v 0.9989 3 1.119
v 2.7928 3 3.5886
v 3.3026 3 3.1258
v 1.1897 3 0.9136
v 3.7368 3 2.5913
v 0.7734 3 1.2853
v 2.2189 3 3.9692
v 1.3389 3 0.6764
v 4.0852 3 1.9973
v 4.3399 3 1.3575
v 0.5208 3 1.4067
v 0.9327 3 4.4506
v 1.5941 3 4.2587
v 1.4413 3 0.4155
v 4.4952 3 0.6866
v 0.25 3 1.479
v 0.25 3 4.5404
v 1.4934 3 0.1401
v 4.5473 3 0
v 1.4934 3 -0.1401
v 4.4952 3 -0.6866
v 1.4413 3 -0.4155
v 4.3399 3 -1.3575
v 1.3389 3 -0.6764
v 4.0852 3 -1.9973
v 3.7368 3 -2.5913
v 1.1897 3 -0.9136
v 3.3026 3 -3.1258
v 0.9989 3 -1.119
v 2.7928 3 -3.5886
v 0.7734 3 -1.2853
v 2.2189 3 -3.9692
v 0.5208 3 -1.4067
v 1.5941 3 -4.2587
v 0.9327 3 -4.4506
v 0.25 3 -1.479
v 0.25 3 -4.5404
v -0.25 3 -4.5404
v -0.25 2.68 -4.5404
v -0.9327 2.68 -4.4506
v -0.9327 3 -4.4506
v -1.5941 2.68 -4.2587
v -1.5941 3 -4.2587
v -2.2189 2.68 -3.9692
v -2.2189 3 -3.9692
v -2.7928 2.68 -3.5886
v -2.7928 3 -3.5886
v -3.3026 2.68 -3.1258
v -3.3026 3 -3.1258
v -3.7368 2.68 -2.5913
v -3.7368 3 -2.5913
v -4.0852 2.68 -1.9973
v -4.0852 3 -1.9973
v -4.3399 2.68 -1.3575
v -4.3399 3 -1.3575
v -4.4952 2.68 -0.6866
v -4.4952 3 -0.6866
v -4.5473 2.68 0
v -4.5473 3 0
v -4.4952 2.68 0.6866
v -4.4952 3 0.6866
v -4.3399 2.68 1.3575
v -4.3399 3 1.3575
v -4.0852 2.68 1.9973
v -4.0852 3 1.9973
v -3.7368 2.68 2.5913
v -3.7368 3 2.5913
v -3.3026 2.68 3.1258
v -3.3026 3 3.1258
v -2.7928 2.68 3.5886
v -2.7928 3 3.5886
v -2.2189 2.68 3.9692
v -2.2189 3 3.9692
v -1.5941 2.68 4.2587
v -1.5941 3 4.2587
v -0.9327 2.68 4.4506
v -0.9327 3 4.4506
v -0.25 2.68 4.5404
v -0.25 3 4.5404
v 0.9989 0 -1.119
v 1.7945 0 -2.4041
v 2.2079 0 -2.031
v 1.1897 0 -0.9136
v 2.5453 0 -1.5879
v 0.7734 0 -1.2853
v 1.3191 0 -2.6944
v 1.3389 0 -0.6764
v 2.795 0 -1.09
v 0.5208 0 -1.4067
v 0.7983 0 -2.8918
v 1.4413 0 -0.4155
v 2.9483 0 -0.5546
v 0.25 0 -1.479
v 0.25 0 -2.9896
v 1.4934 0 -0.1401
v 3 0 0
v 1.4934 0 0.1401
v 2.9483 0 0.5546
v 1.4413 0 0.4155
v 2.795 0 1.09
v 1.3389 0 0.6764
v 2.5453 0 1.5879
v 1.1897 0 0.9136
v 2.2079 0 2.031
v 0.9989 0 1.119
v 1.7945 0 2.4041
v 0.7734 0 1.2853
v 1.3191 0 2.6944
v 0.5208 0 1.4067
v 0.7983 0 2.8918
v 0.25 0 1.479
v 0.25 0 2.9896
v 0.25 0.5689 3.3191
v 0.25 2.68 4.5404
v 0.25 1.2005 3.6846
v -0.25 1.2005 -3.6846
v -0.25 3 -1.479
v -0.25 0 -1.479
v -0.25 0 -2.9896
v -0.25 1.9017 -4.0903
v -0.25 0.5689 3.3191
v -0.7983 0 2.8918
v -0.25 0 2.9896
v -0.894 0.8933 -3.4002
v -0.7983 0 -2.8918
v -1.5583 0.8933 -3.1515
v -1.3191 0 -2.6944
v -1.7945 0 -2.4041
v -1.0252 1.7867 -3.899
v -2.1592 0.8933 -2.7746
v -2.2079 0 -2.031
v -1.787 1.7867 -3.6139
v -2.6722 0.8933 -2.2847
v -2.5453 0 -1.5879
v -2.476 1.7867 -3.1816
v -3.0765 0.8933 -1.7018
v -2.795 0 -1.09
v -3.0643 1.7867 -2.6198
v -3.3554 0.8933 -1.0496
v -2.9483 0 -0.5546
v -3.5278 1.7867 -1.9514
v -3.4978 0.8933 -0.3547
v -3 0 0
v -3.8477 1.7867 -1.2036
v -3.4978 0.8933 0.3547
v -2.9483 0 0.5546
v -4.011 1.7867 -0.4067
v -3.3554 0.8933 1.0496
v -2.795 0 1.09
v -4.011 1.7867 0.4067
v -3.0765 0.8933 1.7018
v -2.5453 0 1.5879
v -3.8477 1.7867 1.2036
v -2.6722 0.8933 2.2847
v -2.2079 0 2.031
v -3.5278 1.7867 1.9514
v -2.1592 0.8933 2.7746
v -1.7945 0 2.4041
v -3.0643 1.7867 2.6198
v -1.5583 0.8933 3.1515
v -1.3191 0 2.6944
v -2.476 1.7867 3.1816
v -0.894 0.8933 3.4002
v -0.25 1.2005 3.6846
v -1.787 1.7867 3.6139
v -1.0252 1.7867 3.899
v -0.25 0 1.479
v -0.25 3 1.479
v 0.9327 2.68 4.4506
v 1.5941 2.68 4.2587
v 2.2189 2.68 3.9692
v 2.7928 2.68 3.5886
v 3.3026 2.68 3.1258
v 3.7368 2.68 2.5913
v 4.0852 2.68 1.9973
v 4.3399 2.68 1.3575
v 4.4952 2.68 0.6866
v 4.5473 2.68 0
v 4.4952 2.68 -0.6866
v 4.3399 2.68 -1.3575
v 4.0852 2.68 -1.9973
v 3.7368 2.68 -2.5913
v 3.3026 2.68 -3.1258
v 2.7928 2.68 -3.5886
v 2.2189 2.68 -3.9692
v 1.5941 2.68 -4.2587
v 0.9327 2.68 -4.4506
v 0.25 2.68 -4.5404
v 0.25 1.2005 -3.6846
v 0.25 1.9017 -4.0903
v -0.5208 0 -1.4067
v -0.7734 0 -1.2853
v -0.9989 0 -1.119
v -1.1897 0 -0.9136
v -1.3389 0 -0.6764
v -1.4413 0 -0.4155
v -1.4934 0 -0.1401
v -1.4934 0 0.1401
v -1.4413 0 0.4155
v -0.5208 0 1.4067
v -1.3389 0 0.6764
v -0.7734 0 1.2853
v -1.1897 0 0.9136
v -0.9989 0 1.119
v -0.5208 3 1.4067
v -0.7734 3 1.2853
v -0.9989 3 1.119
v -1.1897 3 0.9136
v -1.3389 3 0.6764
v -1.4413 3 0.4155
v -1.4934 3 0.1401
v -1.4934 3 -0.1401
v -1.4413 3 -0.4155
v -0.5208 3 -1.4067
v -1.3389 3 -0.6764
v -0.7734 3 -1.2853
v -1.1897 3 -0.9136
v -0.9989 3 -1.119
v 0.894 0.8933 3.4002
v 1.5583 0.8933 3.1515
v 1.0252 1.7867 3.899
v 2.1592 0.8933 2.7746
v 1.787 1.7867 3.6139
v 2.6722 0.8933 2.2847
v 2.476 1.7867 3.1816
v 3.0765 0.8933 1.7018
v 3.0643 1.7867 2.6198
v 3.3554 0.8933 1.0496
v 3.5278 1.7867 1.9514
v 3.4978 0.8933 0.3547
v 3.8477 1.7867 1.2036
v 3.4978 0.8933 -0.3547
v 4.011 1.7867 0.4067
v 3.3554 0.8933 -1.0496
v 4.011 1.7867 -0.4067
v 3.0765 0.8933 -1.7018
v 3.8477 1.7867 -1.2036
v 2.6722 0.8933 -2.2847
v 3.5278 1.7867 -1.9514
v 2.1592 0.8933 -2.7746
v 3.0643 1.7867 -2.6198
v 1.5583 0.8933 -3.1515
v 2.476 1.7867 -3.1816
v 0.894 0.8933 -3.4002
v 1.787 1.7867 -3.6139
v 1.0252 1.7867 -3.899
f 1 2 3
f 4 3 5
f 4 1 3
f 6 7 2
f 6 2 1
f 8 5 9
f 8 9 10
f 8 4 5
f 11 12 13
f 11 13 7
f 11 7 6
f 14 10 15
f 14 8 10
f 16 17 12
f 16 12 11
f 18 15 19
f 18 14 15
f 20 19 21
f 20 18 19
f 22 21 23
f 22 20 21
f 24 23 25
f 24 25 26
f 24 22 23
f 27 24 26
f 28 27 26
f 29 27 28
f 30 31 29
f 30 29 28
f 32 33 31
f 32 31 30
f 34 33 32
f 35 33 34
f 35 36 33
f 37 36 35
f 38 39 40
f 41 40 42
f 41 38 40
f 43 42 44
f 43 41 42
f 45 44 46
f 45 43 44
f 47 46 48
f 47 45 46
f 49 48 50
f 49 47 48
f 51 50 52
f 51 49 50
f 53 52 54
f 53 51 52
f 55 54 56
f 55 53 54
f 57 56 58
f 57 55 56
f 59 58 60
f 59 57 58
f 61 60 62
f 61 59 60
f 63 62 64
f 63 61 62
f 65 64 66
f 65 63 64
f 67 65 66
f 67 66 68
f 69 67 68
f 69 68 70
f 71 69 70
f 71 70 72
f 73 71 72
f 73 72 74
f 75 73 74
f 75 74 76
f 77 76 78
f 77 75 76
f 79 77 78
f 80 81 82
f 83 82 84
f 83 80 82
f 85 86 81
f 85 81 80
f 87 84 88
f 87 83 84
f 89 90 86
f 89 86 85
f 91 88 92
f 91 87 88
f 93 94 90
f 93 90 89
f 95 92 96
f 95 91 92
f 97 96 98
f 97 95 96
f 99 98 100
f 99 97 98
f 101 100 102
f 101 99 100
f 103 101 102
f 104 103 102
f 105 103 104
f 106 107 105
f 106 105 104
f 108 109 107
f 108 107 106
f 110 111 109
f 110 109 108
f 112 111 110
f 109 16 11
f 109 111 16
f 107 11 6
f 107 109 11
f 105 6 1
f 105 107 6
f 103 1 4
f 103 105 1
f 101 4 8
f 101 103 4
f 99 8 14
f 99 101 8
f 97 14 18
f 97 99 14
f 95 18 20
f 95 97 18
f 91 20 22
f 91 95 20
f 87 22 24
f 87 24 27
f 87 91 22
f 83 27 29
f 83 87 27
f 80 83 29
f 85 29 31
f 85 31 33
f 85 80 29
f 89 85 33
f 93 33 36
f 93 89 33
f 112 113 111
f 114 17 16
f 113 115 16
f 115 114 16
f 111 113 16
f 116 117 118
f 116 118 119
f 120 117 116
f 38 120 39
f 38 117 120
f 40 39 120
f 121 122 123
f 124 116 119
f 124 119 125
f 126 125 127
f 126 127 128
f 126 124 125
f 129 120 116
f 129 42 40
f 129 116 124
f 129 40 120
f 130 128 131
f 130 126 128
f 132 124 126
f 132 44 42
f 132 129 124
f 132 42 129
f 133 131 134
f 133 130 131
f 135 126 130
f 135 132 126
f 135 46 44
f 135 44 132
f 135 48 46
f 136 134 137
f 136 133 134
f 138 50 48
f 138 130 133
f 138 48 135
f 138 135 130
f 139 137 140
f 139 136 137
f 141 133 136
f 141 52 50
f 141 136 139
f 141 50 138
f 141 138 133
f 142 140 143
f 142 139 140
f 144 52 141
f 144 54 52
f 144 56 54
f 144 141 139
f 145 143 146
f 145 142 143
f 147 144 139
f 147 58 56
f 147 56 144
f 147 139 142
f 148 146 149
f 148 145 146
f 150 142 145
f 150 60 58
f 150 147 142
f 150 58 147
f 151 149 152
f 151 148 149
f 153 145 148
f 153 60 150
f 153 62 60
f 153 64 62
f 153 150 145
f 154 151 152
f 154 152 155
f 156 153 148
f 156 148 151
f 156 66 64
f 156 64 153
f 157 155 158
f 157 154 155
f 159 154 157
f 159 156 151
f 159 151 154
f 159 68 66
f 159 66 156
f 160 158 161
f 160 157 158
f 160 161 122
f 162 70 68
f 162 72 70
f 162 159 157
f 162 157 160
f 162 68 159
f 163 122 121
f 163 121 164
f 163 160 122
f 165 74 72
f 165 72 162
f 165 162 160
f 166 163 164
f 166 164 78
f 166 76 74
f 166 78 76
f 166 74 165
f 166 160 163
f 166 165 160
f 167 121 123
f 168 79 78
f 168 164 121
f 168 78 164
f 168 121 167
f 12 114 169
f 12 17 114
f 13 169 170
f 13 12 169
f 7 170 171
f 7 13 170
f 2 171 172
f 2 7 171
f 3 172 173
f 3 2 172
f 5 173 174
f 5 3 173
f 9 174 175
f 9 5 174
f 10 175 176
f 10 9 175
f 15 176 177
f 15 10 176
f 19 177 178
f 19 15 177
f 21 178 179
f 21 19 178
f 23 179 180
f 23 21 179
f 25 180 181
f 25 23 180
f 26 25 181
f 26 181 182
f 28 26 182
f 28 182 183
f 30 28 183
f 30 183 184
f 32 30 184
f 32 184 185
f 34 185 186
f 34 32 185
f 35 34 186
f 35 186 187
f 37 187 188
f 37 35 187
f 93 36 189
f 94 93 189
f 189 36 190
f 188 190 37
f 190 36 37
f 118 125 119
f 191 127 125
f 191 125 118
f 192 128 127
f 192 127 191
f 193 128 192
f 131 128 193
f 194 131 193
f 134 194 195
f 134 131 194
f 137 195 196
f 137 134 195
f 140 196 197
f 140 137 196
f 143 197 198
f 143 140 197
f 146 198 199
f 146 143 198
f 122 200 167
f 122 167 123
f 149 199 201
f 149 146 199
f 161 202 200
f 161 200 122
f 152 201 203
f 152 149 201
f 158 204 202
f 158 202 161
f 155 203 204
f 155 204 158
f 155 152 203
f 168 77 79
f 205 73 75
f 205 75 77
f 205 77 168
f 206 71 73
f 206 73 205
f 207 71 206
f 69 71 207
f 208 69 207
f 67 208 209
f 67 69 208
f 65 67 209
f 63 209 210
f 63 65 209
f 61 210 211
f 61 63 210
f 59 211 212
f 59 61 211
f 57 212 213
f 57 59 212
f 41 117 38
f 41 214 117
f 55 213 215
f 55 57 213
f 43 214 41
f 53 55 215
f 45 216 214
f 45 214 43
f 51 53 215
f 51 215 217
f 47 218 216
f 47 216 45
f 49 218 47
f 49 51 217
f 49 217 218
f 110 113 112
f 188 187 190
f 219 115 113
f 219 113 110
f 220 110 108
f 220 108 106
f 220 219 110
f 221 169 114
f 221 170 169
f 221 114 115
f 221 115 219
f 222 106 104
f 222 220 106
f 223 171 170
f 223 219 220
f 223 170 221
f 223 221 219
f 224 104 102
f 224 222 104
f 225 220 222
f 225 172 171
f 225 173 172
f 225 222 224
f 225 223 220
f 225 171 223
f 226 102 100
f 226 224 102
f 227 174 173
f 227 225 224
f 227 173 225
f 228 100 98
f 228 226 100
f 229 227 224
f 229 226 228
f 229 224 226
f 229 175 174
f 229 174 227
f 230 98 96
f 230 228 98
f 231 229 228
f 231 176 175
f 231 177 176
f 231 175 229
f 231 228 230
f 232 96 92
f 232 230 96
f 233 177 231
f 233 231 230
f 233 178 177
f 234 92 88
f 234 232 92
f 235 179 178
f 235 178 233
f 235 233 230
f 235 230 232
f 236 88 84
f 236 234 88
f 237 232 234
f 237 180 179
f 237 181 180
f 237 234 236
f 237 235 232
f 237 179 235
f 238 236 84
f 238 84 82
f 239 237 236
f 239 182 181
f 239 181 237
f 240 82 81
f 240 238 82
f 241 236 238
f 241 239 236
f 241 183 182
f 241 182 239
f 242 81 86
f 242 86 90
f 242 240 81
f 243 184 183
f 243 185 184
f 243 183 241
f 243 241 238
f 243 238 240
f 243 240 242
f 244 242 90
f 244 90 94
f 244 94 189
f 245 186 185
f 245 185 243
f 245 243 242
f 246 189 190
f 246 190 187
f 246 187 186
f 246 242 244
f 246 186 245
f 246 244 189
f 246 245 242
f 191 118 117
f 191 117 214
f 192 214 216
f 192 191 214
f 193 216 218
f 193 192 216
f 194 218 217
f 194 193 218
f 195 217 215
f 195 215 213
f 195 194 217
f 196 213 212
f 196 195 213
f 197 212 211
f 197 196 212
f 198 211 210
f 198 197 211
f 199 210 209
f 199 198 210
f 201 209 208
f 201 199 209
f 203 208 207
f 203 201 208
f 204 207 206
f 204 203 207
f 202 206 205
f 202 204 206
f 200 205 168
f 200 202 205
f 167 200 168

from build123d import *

# Parameters (mm, degrees)
SKETCH2_W          = 0.5
SKETCH2_H          = 10
CUT_EXTRUDE2_DEPTH = 10


with BuildPart() as part:
    # Sketch1 → Revolve1 (revolve)
    with BuildSketch(Plane.XY, mode=Mode.PRIVATE) as revolve1_sk:
        Polygon((1.5, 0), (3, 0), (4.547298721, 2.68), (4.547298721, 3), (1.5, 3), align=None)
    revolve(revolve1_sk.sketch.rotate(Axis((0, 0, 0), (0, 1, 0)), 90), axis=Axis((0, 0, 0), (0, 1, 0)))

    # Sketch2 → Cut-Extrude2 (cut)
    with BuildSketch(Plane(origin=(0, 3, 0), x_dir=(1, 0, 0), z_dir=(0, 1, 0))):
        Rectangle(SKETCH2_W, SKETCH2_H)
    extrude(amount=-CUT_EXTRUDE2_DEPTH, mode=Mode.SUBTRACT)


with BuildPart() as cut_extrude2_piece_1:
    # of the separate pieces the step leaves, piece 1, a body of its own (cut_extrude2_pieces)
    add(part.part.solids().sort_by_distance((0.25, 0, 1.479019946))[0])


with BuildPart() as cut_extrude2_piece_2:
    # of the separate pieces the step leaves, piece 2, a body of its own (cut_extrude2_pieces)
    add(part.part.solids().sort_by_distance((-0.25, 0, -2.989565186))[0])


solid = Compound([cut_extrude2_piece_1.part, cut_extrude2_piece_2.part])
